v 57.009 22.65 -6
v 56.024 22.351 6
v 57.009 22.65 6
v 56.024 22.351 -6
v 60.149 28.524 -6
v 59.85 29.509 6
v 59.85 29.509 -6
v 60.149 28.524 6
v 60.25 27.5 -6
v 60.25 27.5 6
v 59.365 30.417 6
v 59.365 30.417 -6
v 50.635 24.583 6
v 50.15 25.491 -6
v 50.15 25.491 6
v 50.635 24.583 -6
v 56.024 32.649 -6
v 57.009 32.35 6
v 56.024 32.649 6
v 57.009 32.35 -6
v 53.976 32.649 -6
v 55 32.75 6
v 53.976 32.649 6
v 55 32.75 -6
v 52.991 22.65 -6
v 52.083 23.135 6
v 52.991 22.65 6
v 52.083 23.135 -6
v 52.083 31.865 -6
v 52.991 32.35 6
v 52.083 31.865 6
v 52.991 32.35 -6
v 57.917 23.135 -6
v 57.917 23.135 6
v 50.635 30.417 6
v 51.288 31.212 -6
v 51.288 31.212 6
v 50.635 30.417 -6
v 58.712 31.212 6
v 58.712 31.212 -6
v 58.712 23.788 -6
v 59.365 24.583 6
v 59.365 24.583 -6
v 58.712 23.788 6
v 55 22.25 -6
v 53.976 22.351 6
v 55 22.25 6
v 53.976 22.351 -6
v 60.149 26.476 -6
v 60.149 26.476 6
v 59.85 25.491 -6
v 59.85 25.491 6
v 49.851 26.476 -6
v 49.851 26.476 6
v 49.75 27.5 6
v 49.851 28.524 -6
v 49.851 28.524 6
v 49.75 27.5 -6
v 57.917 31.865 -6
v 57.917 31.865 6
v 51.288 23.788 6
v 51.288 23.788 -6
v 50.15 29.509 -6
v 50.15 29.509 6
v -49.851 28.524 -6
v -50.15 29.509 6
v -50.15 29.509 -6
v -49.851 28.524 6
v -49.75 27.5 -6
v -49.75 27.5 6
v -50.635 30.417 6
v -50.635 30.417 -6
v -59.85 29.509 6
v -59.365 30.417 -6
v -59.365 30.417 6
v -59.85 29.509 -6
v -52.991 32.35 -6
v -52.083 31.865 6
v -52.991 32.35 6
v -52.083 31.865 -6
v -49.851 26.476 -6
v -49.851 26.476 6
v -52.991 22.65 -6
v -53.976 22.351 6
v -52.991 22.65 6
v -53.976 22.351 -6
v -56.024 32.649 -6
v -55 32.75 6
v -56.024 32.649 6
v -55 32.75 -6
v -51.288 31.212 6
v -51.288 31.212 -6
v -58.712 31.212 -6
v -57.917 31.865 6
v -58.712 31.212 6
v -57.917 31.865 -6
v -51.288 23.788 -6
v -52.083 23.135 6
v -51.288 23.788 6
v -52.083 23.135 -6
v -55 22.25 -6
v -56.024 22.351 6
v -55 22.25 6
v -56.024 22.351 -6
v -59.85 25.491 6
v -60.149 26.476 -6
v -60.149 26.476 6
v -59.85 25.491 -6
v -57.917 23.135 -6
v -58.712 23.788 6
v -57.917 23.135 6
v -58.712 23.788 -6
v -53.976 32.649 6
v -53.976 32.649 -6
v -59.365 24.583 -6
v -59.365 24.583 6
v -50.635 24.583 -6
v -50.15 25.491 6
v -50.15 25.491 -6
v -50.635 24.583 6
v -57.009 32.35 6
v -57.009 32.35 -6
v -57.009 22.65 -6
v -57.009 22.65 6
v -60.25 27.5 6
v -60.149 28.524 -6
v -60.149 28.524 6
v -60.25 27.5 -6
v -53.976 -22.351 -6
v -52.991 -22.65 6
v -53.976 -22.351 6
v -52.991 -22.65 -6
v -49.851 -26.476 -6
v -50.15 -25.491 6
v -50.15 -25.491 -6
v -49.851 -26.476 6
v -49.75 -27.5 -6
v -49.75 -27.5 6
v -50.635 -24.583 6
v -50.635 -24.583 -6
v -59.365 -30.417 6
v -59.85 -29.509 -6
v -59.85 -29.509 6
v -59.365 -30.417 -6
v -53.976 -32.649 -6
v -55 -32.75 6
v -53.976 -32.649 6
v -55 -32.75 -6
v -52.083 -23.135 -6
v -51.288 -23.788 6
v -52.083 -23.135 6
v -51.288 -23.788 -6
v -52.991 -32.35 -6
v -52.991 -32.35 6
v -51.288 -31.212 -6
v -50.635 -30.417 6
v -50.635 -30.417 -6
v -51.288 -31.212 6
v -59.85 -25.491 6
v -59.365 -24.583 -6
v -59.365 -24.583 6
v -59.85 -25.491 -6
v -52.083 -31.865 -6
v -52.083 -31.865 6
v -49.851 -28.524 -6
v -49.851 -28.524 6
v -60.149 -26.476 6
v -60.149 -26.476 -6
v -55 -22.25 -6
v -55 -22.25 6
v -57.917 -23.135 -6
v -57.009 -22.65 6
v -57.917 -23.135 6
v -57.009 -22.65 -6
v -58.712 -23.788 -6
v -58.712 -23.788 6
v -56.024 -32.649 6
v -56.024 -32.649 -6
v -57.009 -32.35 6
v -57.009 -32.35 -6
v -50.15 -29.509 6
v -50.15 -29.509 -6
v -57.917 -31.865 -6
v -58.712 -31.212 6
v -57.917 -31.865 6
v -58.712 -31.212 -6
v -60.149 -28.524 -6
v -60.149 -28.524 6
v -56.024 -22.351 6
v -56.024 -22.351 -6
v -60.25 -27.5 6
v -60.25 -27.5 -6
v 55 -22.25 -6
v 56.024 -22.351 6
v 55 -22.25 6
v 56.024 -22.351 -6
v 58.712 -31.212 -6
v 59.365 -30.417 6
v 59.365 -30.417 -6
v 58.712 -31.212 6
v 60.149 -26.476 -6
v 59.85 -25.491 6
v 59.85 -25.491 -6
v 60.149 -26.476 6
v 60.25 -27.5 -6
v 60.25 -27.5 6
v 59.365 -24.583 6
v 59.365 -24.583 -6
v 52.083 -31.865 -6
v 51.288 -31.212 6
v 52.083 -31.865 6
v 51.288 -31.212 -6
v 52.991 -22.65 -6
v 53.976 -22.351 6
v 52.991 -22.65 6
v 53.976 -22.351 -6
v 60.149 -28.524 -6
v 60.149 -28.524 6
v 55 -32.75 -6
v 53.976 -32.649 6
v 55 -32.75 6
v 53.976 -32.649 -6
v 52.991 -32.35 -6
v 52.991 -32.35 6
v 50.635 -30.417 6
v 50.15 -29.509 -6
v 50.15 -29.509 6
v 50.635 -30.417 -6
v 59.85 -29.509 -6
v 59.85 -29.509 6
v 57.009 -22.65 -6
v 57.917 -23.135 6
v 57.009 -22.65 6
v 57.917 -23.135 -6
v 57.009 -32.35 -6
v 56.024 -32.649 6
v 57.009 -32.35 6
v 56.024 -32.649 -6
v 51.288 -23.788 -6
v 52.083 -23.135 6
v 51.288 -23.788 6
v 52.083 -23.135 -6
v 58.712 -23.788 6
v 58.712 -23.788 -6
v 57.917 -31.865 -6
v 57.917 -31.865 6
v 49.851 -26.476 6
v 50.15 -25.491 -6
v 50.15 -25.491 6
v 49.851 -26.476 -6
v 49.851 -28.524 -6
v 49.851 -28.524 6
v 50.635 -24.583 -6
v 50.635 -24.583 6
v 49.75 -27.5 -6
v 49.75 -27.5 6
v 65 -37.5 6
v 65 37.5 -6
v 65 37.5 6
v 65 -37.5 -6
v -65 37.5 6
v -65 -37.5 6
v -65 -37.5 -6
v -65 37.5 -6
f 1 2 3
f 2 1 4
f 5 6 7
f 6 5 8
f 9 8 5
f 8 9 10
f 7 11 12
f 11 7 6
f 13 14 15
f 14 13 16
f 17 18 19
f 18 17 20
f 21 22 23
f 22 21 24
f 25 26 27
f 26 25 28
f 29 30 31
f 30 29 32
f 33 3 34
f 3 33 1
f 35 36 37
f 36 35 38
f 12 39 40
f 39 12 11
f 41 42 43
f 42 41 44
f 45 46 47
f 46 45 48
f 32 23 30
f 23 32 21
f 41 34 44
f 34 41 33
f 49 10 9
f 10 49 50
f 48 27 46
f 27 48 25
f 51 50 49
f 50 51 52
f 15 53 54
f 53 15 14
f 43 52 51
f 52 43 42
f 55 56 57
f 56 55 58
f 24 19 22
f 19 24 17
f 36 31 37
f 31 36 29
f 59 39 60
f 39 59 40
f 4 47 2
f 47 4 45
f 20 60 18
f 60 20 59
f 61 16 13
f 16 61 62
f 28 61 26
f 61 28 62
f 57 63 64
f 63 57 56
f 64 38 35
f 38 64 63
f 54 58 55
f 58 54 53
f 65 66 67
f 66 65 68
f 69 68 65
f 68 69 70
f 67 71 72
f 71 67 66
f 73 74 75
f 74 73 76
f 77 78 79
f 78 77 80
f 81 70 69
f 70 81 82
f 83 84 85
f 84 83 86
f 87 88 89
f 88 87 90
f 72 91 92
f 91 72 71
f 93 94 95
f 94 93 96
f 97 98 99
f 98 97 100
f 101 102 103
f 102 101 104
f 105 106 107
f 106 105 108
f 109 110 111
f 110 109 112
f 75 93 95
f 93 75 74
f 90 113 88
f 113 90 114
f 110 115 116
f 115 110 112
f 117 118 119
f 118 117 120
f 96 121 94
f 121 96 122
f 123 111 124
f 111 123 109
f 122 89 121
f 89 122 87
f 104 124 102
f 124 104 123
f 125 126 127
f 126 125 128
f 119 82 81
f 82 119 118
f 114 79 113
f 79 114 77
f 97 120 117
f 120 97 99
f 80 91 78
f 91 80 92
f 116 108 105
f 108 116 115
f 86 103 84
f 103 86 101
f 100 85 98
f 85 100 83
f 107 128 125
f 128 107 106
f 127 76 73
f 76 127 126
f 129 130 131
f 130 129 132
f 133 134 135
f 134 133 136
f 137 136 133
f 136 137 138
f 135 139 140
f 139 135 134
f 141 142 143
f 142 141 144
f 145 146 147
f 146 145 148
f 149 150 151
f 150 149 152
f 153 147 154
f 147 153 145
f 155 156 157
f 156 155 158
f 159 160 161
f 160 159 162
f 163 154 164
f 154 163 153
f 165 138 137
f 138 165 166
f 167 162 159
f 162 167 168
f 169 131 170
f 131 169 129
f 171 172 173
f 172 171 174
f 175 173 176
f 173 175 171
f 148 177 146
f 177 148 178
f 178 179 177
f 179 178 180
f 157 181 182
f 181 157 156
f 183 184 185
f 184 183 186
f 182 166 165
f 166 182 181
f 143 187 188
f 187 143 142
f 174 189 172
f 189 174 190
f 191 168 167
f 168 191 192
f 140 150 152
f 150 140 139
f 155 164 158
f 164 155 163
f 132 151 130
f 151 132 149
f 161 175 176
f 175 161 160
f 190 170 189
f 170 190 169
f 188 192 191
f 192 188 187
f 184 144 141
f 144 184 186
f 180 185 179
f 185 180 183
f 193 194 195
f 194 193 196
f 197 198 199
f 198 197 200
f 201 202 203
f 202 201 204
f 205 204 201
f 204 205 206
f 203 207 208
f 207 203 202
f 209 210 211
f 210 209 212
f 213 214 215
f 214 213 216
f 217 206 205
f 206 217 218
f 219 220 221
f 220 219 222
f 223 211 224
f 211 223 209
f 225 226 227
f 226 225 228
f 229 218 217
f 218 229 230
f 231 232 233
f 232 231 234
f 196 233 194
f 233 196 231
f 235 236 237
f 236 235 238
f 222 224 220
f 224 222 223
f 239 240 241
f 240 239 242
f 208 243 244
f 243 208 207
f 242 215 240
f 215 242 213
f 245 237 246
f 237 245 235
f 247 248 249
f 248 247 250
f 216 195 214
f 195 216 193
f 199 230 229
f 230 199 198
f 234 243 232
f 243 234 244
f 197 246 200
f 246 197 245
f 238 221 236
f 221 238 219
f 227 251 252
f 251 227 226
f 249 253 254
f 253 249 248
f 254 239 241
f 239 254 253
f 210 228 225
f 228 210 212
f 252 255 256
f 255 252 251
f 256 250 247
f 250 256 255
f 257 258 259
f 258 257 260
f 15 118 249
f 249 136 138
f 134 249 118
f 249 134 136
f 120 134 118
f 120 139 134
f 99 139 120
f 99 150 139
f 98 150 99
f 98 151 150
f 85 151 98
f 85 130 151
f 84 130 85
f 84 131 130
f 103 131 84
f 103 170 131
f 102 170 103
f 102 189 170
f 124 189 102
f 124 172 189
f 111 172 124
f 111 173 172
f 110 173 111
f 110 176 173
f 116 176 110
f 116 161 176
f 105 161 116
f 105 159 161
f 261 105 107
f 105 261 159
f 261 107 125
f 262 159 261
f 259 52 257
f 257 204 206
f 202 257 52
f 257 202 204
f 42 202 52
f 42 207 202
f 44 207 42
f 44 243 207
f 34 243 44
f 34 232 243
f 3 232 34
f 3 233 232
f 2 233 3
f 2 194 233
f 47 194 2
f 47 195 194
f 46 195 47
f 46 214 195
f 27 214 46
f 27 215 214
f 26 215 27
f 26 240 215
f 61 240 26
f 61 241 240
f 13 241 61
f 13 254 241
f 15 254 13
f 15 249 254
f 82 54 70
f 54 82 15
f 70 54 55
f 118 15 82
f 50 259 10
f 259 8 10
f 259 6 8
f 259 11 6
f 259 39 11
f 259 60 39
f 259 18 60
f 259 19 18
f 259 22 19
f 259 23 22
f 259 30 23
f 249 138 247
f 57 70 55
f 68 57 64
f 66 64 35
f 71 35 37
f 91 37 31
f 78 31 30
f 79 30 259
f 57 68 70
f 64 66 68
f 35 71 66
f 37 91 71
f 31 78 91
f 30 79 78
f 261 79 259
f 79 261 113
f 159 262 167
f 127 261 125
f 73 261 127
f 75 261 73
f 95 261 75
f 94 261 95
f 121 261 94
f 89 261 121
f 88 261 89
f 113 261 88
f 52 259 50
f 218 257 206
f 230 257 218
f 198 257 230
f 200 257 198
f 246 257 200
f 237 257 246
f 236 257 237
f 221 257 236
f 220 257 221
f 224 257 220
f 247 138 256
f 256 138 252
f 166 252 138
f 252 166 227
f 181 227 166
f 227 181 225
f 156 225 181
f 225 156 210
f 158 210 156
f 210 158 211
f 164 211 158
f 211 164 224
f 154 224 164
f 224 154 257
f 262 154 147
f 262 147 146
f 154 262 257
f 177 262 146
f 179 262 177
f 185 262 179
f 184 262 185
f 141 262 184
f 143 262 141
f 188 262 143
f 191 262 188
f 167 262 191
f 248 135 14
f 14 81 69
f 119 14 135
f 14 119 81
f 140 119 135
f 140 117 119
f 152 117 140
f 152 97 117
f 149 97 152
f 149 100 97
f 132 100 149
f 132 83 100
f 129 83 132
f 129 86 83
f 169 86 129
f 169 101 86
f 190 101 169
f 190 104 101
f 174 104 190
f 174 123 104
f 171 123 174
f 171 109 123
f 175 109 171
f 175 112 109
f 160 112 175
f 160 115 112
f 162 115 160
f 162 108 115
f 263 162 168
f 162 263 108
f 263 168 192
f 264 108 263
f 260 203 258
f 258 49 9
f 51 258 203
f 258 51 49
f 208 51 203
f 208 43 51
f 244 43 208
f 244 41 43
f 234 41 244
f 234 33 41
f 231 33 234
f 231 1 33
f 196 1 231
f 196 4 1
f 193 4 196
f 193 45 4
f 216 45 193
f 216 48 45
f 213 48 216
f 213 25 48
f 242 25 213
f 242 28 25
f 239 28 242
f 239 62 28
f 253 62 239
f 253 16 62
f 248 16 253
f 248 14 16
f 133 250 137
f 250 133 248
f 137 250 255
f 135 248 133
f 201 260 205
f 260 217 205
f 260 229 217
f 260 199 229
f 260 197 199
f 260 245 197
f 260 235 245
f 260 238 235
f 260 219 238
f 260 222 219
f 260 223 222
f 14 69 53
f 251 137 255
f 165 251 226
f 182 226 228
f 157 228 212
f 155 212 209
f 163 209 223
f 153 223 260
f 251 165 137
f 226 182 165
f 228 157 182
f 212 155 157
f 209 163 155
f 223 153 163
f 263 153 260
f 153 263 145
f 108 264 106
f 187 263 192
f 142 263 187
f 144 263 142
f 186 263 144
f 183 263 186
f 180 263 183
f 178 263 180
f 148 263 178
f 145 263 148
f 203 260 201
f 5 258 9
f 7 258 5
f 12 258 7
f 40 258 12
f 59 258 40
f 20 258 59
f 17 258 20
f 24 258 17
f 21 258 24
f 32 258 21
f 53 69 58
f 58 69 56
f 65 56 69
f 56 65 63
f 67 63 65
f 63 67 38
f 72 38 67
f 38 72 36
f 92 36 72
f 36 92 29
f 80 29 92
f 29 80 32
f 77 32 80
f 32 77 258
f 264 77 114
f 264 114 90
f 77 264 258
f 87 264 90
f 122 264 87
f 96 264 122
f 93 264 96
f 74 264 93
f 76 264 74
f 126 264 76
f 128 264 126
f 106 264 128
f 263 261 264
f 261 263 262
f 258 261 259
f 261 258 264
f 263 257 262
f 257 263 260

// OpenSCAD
$fn = 32;

// ----------------------------------------------------------------------
// Corner plate 130 x 75 x 12
// 4 holes, centres taken from the edge offset
// ----------------------------------------------------------------------

// --- parameters (mm) ---
plate = [130, 75, 12];  // overall size (x, y, z)
holes = 4;              // number of holes the drawing asks for
hole_d = 10.5;          // hole diameter
edge = 10;              // hole centre offset from the plate edge

// --- derived feature positions (mm) ---
corner_x = plate[0] / 2 - edge;  // = 55   corner hole X
corner_y = plate[1] / 2 - edge;  // = 27.5   corner hole Y
feature_centers = [
  [corner_x, corner_y],
  [-corner_x, corner_y],
  [-corner_x, -corner_y],
  [corner_x, -corner_y]
];   // hole centres the loop below drills

// plate outline, every hole drilled through with the same cutters
difference() {
  cube(plate, center = true);
  for (centre = feature_centers)
    translate([centre[0], centre[1], 0])
      cylinder(d = hole_d, h = plate[2] + 2, center = true);
}
